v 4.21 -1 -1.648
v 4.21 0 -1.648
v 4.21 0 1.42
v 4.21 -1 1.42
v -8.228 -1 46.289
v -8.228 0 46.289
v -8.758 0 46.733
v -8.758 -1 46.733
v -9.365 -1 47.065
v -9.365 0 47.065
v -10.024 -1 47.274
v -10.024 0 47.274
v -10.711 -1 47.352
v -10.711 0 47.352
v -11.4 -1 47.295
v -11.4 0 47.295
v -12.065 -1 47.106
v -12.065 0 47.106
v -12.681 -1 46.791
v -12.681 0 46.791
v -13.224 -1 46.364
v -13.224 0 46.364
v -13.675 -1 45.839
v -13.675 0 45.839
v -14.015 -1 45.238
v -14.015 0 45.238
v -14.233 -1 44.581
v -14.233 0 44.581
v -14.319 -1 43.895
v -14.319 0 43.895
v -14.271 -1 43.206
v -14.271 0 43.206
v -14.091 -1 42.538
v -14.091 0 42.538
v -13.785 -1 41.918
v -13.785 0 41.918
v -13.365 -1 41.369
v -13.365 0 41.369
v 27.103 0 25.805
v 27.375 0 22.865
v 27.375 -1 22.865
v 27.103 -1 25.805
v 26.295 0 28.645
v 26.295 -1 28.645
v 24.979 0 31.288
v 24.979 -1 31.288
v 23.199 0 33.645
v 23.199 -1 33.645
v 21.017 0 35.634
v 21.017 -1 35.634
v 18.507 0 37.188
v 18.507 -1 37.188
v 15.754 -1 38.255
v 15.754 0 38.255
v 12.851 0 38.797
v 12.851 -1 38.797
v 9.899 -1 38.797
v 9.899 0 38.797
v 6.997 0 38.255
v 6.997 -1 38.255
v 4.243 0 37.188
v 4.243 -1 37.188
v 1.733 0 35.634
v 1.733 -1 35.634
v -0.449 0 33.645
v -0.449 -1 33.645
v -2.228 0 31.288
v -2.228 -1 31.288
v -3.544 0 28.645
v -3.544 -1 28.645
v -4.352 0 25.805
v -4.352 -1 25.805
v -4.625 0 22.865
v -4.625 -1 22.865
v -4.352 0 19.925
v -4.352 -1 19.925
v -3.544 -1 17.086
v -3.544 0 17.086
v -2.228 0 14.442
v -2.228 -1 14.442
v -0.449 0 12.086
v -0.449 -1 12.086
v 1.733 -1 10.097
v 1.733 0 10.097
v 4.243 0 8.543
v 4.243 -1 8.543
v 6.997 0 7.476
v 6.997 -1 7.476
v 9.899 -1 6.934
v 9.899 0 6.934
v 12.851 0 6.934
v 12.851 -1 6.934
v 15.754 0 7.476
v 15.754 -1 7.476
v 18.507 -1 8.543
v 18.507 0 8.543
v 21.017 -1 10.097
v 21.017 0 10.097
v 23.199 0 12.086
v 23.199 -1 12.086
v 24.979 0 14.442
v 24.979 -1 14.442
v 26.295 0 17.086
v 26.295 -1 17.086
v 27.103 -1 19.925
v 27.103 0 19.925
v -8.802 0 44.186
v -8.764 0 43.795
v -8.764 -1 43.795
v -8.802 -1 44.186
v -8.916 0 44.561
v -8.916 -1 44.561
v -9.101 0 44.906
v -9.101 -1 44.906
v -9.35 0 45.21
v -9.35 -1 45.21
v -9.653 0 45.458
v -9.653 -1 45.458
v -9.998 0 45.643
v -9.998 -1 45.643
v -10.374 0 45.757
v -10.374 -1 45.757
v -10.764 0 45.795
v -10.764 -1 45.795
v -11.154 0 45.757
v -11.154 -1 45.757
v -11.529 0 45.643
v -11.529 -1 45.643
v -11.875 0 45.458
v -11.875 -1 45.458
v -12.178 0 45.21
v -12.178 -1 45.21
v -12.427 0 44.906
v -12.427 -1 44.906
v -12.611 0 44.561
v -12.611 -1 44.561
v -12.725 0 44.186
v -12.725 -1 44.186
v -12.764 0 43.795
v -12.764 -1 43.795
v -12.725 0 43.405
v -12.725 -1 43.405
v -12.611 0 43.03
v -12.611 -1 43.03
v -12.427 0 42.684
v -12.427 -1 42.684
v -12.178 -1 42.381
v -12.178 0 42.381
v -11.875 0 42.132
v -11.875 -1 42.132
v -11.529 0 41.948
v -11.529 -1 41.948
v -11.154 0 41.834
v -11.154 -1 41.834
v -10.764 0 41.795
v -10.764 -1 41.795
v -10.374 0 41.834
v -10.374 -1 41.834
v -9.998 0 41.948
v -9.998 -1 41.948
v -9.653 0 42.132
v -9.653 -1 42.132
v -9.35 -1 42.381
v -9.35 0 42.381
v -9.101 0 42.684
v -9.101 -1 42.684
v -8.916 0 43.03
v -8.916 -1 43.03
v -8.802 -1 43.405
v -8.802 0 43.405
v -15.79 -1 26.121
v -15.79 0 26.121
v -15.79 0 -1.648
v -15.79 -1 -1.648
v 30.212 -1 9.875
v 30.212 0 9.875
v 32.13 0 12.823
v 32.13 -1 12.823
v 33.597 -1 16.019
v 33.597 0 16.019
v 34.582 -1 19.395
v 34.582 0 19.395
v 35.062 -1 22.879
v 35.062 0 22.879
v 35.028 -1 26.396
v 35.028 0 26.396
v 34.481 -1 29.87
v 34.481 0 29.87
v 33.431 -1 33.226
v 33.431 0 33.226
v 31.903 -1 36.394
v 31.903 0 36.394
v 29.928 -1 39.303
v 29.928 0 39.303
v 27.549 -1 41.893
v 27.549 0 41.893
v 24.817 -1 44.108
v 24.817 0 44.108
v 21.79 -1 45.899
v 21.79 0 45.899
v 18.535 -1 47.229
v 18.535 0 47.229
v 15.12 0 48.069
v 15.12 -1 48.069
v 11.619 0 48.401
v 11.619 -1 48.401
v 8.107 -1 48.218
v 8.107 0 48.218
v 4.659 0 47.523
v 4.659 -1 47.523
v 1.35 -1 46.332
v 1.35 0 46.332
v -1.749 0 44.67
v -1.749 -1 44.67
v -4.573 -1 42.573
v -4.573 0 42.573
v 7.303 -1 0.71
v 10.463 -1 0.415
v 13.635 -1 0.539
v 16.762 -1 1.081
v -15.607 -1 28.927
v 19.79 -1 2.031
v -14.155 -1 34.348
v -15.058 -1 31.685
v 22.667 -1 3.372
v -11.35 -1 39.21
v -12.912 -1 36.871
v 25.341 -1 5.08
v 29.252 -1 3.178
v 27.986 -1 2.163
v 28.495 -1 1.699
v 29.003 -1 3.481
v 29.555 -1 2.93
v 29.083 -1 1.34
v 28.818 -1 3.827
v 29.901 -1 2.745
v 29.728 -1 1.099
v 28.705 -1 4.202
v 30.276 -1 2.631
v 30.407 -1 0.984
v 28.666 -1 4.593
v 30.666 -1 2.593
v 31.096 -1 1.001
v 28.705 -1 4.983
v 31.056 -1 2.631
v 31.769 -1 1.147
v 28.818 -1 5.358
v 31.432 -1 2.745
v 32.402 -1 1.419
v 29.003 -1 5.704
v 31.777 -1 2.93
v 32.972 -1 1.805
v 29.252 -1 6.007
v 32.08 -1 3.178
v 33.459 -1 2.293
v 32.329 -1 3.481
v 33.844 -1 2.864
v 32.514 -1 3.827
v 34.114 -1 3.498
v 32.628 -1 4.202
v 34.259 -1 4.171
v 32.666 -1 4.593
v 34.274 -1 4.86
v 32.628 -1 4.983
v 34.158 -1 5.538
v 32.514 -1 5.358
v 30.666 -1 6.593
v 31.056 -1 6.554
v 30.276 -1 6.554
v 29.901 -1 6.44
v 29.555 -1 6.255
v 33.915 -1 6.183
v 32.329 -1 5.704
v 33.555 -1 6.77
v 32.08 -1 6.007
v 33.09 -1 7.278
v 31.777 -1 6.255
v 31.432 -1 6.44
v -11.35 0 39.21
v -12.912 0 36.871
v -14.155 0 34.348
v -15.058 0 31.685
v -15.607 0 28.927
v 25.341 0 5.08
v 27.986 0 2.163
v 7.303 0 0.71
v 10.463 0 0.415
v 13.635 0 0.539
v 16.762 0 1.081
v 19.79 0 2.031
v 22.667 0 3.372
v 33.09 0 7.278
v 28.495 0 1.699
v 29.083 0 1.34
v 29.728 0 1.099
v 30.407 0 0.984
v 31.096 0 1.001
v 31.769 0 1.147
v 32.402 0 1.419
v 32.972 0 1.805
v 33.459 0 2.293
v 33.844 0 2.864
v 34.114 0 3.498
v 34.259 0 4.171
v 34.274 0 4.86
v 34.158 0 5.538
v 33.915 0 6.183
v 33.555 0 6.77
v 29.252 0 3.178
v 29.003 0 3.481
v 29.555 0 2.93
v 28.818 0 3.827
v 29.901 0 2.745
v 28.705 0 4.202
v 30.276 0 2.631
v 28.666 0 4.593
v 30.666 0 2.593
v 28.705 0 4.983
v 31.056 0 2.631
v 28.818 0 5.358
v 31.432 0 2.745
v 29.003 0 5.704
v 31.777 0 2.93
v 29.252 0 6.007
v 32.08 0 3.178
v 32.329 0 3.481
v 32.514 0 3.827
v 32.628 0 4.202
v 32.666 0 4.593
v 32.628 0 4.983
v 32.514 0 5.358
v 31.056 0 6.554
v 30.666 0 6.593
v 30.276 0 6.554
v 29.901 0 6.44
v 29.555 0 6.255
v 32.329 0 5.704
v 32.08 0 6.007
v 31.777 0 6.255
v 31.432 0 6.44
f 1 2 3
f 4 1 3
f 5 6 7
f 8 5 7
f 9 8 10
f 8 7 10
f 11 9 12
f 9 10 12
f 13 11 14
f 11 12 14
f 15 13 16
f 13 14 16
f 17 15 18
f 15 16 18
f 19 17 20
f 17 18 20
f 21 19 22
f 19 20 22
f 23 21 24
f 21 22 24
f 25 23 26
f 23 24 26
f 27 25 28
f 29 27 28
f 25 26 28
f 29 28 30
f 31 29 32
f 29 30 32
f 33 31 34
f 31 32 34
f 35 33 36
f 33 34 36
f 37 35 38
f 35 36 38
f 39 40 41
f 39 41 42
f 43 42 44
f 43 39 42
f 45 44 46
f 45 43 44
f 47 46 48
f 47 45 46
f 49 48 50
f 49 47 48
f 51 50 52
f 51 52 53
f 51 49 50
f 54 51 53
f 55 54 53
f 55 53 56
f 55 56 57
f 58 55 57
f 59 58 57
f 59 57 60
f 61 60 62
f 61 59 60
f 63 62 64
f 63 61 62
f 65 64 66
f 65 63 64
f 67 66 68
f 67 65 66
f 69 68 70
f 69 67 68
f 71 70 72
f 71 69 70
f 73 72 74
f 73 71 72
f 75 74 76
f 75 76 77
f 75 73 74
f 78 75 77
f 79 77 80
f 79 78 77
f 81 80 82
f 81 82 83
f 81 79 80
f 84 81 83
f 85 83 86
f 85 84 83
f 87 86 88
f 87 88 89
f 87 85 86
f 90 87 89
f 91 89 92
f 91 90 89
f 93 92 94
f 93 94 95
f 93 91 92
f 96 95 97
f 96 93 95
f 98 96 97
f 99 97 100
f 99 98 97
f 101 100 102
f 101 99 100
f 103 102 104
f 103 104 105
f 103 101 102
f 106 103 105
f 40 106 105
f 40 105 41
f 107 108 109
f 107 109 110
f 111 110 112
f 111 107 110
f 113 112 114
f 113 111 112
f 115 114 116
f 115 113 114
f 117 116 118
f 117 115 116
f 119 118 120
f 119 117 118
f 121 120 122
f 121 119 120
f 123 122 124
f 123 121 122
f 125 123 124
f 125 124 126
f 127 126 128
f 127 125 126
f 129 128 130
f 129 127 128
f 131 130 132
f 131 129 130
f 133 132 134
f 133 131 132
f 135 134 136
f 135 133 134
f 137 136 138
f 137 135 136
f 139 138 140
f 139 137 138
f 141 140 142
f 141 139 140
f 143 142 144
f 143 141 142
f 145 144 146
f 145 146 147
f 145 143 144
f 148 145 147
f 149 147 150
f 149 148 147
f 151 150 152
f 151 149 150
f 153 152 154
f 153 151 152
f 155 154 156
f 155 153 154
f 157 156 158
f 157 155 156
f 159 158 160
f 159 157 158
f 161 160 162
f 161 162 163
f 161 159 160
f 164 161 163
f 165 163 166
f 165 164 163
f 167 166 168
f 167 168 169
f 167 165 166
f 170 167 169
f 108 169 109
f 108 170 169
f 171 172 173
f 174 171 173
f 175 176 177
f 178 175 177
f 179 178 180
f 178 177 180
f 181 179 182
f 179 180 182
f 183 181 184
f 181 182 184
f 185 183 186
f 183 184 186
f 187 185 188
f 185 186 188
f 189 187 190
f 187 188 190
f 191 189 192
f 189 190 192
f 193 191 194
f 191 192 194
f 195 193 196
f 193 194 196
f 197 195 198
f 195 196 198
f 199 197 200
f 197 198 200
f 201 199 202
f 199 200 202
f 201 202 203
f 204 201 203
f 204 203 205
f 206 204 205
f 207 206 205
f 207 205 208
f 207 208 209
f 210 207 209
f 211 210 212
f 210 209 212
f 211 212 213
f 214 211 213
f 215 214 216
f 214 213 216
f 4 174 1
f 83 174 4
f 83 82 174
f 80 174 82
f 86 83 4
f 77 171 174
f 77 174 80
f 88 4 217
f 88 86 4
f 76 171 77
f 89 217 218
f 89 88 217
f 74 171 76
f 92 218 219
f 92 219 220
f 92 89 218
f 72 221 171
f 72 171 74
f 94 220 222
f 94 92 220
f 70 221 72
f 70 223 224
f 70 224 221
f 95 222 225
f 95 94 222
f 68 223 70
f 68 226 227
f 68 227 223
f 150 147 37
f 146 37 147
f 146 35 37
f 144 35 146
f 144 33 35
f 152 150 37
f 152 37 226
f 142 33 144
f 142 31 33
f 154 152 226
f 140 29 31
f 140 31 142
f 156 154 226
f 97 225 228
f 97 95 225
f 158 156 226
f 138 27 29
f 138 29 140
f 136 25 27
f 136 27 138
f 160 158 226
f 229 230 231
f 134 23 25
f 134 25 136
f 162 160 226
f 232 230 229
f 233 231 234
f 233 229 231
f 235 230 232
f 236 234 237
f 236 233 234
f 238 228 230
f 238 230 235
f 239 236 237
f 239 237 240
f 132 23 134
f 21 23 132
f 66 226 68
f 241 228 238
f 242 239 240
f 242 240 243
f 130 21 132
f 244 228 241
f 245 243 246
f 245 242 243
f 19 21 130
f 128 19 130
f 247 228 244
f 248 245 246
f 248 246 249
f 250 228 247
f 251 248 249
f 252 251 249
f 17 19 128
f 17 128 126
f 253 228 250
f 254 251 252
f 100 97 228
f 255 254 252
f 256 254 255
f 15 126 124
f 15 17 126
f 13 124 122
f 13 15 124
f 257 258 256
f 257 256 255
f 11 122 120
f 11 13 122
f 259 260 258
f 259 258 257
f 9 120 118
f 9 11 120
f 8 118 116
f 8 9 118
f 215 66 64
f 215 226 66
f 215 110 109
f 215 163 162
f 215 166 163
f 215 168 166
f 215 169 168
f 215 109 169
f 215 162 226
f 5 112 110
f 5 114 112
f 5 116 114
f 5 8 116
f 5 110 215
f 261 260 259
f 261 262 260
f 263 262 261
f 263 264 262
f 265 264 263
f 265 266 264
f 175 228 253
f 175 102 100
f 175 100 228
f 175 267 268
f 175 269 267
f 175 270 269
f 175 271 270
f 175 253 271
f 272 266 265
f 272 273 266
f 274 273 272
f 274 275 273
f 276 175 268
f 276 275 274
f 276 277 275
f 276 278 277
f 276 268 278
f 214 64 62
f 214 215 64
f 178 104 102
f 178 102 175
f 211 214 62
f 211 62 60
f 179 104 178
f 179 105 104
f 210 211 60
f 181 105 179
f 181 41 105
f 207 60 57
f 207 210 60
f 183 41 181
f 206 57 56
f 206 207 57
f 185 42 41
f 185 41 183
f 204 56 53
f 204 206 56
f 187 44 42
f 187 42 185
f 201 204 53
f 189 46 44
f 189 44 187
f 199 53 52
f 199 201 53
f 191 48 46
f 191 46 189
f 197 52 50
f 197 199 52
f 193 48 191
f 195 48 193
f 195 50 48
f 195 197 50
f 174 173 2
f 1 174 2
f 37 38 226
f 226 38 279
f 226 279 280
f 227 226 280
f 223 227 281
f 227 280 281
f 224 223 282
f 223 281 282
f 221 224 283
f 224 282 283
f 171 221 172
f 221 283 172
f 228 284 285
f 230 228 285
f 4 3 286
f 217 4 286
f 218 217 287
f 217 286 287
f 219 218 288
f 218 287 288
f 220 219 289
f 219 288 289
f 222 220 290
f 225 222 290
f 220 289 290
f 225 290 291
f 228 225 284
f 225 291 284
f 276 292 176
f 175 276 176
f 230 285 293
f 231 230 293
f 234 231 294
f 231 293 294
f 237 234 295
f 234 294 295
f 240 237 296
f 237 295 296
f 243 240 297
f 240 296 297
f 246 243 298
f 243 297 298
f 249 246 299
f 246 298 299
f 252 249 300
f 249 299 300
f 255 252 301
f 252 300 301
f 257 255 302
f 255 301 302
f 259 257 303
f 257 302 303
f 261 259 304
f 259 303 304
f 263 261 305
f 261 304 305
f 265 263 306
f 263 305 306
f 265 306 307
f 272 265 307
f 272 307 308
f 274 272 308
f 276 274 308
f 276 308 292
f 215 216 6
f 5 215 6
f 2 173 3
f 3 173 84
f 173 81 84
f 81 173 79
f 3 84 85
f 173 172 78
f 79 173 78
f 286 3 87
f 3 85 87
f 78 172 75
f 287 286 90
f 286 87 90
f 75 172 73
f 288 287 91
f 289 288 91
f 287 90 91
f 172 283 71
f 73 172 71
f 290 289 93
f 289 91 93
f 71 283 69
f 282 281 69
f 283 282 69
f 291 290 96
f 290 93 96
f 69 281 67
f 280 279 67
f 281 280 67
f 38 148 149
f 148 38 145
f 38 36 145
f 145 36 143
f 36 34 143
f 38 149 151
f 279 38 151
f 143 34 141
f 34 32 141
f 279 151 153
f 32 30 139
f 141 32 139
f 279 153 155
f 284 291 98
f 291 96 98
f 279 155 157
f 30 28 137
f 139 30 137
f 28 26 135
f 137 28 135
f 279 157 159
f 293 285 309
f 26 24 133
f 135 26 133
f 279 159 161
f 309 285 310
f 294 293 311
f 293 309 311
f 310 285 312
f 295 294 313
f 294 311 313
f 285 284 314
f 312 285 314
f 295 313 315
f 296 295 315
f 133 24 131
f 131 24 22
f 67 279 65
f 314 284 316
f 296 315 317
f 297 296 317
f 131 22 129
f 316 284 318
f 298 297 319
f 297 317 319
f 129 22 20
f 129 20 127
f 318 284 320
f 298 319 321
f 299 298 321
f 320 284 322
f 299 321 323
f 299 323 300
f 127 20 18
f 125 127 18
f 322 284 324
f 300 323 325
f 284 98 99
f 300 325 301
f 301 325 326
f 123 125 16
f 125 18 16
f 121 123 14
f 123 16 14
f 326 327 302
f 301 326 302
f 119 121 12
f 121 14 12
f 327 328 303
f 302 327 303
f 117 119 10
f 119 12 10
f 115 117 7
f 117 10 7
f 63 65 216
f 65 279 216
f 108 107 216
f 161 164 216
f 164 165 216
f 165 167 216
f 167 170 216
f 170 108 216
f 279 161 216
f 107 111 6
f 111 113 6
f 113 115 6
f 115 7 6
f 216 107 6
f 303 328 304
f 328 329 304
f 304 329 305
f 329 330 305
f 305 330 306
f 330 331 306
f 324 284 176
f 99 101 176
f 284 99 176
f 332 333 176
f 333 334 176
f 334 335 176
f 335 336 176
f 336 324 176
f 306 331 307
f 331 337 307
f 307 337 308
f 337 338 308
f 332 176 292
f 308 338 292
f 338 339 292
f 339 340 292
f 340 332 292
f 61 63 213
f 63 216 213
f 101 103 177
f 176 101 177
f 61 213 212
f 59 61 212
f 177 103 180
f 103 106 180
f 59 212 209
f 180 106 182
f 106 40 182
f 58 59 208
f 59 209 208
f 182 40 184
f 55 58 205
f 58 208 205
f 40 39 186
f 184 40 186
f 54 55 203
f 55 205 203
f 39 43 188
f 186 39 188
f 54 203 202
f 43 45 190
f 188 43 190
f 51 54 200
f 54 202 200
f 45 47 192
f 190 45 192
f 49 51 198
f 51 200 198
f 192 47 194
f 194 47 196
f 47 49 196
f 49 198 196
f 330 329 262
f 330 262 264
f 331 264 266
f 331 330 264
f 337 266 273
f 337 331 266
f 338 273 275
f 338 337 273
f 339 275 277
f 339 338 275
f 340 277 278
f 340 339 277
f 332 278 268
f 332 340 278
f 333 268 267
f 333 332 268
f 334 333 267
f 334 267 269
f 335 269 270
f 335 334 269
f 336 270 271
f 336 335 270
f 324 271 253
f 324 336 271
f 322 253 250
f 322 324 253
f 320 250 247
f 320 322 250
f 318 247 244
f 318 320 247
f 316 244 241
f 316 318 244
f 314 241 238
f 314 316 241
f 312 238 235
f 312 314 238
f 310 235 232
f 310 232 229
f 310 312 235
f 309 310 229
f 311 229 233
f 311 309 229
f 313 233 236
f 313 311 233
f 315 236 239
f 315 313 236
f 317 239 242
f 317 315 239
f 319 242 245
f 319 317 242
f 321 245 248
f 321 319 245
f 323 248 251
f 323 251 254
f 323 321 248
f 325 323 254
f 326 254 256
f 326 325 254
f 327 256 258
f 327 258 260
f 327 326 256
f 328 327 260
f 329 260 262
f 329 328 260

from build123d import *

# Parameters (mm, degrees)
F0_R     = 16
F0_R_2   = 2
F1_DEPTH = 1


with BuildPart() as f1:
    # F0 (on Front) → F1 (new body)
    with BuildSketch(Plane.XZ):
        with Locations((11.375166, 22.865392)):
            Circle(F0_R)
        with BuildLine():
            Line((4.209625, -1.647812), (4.209625, 1.420013))
            ThreePointArc((4.209625, 1.420013), (15.207091, 0.758549), (25.341338, 5.080448))
            Line((25.341338, 5.080448), (27.98607, 2.162959))
            ThreePointArc((27.98607, 2.162959), (33.227056, 2.037489), (33.08977, 7.27818))
            Line((33.08977, 7.27818), (30.211789, 9.875299))
            ThreePointArc((30.211789, 9.875299), (27.548758, 41.893357), (-4.572665, 42.57308))
            Line((-4.572665, 42.57308), (-8.227887, 46.289463))
            ThreePointArc((-8.227887, 46.289463), (-13.224062, 46.363974), (-13.364673, 41.369222))
            Line((-13.364673, 41.369222), (-11.350405, 39.209819))
            ThreePointArc((-11.350405, 39.209819), (-14.650167, 33.0315), (-15.790375, 26.12064))
            Line((-15.790375, 26.12064), (-15.790375, -1.647812))
            Line((-15.790375, -1.647812), (4.209625, -1.647812))
        make_face()
        with Locations((30.666229, 4.592549)):
            Circle(F0_R_2, mode=Mode.SUBTRACT)
        with Locations((11.375166, 22.865392)):
            Circle(F0_R, mode=Mode.SUBTRACT)
        with Locations((-10.763726, 43.795356)):
            Circle(F0_R_2, mode=Mode.SUBTRACT)
    extrude(amount=F1_DEPTH)


solid = f1.part
